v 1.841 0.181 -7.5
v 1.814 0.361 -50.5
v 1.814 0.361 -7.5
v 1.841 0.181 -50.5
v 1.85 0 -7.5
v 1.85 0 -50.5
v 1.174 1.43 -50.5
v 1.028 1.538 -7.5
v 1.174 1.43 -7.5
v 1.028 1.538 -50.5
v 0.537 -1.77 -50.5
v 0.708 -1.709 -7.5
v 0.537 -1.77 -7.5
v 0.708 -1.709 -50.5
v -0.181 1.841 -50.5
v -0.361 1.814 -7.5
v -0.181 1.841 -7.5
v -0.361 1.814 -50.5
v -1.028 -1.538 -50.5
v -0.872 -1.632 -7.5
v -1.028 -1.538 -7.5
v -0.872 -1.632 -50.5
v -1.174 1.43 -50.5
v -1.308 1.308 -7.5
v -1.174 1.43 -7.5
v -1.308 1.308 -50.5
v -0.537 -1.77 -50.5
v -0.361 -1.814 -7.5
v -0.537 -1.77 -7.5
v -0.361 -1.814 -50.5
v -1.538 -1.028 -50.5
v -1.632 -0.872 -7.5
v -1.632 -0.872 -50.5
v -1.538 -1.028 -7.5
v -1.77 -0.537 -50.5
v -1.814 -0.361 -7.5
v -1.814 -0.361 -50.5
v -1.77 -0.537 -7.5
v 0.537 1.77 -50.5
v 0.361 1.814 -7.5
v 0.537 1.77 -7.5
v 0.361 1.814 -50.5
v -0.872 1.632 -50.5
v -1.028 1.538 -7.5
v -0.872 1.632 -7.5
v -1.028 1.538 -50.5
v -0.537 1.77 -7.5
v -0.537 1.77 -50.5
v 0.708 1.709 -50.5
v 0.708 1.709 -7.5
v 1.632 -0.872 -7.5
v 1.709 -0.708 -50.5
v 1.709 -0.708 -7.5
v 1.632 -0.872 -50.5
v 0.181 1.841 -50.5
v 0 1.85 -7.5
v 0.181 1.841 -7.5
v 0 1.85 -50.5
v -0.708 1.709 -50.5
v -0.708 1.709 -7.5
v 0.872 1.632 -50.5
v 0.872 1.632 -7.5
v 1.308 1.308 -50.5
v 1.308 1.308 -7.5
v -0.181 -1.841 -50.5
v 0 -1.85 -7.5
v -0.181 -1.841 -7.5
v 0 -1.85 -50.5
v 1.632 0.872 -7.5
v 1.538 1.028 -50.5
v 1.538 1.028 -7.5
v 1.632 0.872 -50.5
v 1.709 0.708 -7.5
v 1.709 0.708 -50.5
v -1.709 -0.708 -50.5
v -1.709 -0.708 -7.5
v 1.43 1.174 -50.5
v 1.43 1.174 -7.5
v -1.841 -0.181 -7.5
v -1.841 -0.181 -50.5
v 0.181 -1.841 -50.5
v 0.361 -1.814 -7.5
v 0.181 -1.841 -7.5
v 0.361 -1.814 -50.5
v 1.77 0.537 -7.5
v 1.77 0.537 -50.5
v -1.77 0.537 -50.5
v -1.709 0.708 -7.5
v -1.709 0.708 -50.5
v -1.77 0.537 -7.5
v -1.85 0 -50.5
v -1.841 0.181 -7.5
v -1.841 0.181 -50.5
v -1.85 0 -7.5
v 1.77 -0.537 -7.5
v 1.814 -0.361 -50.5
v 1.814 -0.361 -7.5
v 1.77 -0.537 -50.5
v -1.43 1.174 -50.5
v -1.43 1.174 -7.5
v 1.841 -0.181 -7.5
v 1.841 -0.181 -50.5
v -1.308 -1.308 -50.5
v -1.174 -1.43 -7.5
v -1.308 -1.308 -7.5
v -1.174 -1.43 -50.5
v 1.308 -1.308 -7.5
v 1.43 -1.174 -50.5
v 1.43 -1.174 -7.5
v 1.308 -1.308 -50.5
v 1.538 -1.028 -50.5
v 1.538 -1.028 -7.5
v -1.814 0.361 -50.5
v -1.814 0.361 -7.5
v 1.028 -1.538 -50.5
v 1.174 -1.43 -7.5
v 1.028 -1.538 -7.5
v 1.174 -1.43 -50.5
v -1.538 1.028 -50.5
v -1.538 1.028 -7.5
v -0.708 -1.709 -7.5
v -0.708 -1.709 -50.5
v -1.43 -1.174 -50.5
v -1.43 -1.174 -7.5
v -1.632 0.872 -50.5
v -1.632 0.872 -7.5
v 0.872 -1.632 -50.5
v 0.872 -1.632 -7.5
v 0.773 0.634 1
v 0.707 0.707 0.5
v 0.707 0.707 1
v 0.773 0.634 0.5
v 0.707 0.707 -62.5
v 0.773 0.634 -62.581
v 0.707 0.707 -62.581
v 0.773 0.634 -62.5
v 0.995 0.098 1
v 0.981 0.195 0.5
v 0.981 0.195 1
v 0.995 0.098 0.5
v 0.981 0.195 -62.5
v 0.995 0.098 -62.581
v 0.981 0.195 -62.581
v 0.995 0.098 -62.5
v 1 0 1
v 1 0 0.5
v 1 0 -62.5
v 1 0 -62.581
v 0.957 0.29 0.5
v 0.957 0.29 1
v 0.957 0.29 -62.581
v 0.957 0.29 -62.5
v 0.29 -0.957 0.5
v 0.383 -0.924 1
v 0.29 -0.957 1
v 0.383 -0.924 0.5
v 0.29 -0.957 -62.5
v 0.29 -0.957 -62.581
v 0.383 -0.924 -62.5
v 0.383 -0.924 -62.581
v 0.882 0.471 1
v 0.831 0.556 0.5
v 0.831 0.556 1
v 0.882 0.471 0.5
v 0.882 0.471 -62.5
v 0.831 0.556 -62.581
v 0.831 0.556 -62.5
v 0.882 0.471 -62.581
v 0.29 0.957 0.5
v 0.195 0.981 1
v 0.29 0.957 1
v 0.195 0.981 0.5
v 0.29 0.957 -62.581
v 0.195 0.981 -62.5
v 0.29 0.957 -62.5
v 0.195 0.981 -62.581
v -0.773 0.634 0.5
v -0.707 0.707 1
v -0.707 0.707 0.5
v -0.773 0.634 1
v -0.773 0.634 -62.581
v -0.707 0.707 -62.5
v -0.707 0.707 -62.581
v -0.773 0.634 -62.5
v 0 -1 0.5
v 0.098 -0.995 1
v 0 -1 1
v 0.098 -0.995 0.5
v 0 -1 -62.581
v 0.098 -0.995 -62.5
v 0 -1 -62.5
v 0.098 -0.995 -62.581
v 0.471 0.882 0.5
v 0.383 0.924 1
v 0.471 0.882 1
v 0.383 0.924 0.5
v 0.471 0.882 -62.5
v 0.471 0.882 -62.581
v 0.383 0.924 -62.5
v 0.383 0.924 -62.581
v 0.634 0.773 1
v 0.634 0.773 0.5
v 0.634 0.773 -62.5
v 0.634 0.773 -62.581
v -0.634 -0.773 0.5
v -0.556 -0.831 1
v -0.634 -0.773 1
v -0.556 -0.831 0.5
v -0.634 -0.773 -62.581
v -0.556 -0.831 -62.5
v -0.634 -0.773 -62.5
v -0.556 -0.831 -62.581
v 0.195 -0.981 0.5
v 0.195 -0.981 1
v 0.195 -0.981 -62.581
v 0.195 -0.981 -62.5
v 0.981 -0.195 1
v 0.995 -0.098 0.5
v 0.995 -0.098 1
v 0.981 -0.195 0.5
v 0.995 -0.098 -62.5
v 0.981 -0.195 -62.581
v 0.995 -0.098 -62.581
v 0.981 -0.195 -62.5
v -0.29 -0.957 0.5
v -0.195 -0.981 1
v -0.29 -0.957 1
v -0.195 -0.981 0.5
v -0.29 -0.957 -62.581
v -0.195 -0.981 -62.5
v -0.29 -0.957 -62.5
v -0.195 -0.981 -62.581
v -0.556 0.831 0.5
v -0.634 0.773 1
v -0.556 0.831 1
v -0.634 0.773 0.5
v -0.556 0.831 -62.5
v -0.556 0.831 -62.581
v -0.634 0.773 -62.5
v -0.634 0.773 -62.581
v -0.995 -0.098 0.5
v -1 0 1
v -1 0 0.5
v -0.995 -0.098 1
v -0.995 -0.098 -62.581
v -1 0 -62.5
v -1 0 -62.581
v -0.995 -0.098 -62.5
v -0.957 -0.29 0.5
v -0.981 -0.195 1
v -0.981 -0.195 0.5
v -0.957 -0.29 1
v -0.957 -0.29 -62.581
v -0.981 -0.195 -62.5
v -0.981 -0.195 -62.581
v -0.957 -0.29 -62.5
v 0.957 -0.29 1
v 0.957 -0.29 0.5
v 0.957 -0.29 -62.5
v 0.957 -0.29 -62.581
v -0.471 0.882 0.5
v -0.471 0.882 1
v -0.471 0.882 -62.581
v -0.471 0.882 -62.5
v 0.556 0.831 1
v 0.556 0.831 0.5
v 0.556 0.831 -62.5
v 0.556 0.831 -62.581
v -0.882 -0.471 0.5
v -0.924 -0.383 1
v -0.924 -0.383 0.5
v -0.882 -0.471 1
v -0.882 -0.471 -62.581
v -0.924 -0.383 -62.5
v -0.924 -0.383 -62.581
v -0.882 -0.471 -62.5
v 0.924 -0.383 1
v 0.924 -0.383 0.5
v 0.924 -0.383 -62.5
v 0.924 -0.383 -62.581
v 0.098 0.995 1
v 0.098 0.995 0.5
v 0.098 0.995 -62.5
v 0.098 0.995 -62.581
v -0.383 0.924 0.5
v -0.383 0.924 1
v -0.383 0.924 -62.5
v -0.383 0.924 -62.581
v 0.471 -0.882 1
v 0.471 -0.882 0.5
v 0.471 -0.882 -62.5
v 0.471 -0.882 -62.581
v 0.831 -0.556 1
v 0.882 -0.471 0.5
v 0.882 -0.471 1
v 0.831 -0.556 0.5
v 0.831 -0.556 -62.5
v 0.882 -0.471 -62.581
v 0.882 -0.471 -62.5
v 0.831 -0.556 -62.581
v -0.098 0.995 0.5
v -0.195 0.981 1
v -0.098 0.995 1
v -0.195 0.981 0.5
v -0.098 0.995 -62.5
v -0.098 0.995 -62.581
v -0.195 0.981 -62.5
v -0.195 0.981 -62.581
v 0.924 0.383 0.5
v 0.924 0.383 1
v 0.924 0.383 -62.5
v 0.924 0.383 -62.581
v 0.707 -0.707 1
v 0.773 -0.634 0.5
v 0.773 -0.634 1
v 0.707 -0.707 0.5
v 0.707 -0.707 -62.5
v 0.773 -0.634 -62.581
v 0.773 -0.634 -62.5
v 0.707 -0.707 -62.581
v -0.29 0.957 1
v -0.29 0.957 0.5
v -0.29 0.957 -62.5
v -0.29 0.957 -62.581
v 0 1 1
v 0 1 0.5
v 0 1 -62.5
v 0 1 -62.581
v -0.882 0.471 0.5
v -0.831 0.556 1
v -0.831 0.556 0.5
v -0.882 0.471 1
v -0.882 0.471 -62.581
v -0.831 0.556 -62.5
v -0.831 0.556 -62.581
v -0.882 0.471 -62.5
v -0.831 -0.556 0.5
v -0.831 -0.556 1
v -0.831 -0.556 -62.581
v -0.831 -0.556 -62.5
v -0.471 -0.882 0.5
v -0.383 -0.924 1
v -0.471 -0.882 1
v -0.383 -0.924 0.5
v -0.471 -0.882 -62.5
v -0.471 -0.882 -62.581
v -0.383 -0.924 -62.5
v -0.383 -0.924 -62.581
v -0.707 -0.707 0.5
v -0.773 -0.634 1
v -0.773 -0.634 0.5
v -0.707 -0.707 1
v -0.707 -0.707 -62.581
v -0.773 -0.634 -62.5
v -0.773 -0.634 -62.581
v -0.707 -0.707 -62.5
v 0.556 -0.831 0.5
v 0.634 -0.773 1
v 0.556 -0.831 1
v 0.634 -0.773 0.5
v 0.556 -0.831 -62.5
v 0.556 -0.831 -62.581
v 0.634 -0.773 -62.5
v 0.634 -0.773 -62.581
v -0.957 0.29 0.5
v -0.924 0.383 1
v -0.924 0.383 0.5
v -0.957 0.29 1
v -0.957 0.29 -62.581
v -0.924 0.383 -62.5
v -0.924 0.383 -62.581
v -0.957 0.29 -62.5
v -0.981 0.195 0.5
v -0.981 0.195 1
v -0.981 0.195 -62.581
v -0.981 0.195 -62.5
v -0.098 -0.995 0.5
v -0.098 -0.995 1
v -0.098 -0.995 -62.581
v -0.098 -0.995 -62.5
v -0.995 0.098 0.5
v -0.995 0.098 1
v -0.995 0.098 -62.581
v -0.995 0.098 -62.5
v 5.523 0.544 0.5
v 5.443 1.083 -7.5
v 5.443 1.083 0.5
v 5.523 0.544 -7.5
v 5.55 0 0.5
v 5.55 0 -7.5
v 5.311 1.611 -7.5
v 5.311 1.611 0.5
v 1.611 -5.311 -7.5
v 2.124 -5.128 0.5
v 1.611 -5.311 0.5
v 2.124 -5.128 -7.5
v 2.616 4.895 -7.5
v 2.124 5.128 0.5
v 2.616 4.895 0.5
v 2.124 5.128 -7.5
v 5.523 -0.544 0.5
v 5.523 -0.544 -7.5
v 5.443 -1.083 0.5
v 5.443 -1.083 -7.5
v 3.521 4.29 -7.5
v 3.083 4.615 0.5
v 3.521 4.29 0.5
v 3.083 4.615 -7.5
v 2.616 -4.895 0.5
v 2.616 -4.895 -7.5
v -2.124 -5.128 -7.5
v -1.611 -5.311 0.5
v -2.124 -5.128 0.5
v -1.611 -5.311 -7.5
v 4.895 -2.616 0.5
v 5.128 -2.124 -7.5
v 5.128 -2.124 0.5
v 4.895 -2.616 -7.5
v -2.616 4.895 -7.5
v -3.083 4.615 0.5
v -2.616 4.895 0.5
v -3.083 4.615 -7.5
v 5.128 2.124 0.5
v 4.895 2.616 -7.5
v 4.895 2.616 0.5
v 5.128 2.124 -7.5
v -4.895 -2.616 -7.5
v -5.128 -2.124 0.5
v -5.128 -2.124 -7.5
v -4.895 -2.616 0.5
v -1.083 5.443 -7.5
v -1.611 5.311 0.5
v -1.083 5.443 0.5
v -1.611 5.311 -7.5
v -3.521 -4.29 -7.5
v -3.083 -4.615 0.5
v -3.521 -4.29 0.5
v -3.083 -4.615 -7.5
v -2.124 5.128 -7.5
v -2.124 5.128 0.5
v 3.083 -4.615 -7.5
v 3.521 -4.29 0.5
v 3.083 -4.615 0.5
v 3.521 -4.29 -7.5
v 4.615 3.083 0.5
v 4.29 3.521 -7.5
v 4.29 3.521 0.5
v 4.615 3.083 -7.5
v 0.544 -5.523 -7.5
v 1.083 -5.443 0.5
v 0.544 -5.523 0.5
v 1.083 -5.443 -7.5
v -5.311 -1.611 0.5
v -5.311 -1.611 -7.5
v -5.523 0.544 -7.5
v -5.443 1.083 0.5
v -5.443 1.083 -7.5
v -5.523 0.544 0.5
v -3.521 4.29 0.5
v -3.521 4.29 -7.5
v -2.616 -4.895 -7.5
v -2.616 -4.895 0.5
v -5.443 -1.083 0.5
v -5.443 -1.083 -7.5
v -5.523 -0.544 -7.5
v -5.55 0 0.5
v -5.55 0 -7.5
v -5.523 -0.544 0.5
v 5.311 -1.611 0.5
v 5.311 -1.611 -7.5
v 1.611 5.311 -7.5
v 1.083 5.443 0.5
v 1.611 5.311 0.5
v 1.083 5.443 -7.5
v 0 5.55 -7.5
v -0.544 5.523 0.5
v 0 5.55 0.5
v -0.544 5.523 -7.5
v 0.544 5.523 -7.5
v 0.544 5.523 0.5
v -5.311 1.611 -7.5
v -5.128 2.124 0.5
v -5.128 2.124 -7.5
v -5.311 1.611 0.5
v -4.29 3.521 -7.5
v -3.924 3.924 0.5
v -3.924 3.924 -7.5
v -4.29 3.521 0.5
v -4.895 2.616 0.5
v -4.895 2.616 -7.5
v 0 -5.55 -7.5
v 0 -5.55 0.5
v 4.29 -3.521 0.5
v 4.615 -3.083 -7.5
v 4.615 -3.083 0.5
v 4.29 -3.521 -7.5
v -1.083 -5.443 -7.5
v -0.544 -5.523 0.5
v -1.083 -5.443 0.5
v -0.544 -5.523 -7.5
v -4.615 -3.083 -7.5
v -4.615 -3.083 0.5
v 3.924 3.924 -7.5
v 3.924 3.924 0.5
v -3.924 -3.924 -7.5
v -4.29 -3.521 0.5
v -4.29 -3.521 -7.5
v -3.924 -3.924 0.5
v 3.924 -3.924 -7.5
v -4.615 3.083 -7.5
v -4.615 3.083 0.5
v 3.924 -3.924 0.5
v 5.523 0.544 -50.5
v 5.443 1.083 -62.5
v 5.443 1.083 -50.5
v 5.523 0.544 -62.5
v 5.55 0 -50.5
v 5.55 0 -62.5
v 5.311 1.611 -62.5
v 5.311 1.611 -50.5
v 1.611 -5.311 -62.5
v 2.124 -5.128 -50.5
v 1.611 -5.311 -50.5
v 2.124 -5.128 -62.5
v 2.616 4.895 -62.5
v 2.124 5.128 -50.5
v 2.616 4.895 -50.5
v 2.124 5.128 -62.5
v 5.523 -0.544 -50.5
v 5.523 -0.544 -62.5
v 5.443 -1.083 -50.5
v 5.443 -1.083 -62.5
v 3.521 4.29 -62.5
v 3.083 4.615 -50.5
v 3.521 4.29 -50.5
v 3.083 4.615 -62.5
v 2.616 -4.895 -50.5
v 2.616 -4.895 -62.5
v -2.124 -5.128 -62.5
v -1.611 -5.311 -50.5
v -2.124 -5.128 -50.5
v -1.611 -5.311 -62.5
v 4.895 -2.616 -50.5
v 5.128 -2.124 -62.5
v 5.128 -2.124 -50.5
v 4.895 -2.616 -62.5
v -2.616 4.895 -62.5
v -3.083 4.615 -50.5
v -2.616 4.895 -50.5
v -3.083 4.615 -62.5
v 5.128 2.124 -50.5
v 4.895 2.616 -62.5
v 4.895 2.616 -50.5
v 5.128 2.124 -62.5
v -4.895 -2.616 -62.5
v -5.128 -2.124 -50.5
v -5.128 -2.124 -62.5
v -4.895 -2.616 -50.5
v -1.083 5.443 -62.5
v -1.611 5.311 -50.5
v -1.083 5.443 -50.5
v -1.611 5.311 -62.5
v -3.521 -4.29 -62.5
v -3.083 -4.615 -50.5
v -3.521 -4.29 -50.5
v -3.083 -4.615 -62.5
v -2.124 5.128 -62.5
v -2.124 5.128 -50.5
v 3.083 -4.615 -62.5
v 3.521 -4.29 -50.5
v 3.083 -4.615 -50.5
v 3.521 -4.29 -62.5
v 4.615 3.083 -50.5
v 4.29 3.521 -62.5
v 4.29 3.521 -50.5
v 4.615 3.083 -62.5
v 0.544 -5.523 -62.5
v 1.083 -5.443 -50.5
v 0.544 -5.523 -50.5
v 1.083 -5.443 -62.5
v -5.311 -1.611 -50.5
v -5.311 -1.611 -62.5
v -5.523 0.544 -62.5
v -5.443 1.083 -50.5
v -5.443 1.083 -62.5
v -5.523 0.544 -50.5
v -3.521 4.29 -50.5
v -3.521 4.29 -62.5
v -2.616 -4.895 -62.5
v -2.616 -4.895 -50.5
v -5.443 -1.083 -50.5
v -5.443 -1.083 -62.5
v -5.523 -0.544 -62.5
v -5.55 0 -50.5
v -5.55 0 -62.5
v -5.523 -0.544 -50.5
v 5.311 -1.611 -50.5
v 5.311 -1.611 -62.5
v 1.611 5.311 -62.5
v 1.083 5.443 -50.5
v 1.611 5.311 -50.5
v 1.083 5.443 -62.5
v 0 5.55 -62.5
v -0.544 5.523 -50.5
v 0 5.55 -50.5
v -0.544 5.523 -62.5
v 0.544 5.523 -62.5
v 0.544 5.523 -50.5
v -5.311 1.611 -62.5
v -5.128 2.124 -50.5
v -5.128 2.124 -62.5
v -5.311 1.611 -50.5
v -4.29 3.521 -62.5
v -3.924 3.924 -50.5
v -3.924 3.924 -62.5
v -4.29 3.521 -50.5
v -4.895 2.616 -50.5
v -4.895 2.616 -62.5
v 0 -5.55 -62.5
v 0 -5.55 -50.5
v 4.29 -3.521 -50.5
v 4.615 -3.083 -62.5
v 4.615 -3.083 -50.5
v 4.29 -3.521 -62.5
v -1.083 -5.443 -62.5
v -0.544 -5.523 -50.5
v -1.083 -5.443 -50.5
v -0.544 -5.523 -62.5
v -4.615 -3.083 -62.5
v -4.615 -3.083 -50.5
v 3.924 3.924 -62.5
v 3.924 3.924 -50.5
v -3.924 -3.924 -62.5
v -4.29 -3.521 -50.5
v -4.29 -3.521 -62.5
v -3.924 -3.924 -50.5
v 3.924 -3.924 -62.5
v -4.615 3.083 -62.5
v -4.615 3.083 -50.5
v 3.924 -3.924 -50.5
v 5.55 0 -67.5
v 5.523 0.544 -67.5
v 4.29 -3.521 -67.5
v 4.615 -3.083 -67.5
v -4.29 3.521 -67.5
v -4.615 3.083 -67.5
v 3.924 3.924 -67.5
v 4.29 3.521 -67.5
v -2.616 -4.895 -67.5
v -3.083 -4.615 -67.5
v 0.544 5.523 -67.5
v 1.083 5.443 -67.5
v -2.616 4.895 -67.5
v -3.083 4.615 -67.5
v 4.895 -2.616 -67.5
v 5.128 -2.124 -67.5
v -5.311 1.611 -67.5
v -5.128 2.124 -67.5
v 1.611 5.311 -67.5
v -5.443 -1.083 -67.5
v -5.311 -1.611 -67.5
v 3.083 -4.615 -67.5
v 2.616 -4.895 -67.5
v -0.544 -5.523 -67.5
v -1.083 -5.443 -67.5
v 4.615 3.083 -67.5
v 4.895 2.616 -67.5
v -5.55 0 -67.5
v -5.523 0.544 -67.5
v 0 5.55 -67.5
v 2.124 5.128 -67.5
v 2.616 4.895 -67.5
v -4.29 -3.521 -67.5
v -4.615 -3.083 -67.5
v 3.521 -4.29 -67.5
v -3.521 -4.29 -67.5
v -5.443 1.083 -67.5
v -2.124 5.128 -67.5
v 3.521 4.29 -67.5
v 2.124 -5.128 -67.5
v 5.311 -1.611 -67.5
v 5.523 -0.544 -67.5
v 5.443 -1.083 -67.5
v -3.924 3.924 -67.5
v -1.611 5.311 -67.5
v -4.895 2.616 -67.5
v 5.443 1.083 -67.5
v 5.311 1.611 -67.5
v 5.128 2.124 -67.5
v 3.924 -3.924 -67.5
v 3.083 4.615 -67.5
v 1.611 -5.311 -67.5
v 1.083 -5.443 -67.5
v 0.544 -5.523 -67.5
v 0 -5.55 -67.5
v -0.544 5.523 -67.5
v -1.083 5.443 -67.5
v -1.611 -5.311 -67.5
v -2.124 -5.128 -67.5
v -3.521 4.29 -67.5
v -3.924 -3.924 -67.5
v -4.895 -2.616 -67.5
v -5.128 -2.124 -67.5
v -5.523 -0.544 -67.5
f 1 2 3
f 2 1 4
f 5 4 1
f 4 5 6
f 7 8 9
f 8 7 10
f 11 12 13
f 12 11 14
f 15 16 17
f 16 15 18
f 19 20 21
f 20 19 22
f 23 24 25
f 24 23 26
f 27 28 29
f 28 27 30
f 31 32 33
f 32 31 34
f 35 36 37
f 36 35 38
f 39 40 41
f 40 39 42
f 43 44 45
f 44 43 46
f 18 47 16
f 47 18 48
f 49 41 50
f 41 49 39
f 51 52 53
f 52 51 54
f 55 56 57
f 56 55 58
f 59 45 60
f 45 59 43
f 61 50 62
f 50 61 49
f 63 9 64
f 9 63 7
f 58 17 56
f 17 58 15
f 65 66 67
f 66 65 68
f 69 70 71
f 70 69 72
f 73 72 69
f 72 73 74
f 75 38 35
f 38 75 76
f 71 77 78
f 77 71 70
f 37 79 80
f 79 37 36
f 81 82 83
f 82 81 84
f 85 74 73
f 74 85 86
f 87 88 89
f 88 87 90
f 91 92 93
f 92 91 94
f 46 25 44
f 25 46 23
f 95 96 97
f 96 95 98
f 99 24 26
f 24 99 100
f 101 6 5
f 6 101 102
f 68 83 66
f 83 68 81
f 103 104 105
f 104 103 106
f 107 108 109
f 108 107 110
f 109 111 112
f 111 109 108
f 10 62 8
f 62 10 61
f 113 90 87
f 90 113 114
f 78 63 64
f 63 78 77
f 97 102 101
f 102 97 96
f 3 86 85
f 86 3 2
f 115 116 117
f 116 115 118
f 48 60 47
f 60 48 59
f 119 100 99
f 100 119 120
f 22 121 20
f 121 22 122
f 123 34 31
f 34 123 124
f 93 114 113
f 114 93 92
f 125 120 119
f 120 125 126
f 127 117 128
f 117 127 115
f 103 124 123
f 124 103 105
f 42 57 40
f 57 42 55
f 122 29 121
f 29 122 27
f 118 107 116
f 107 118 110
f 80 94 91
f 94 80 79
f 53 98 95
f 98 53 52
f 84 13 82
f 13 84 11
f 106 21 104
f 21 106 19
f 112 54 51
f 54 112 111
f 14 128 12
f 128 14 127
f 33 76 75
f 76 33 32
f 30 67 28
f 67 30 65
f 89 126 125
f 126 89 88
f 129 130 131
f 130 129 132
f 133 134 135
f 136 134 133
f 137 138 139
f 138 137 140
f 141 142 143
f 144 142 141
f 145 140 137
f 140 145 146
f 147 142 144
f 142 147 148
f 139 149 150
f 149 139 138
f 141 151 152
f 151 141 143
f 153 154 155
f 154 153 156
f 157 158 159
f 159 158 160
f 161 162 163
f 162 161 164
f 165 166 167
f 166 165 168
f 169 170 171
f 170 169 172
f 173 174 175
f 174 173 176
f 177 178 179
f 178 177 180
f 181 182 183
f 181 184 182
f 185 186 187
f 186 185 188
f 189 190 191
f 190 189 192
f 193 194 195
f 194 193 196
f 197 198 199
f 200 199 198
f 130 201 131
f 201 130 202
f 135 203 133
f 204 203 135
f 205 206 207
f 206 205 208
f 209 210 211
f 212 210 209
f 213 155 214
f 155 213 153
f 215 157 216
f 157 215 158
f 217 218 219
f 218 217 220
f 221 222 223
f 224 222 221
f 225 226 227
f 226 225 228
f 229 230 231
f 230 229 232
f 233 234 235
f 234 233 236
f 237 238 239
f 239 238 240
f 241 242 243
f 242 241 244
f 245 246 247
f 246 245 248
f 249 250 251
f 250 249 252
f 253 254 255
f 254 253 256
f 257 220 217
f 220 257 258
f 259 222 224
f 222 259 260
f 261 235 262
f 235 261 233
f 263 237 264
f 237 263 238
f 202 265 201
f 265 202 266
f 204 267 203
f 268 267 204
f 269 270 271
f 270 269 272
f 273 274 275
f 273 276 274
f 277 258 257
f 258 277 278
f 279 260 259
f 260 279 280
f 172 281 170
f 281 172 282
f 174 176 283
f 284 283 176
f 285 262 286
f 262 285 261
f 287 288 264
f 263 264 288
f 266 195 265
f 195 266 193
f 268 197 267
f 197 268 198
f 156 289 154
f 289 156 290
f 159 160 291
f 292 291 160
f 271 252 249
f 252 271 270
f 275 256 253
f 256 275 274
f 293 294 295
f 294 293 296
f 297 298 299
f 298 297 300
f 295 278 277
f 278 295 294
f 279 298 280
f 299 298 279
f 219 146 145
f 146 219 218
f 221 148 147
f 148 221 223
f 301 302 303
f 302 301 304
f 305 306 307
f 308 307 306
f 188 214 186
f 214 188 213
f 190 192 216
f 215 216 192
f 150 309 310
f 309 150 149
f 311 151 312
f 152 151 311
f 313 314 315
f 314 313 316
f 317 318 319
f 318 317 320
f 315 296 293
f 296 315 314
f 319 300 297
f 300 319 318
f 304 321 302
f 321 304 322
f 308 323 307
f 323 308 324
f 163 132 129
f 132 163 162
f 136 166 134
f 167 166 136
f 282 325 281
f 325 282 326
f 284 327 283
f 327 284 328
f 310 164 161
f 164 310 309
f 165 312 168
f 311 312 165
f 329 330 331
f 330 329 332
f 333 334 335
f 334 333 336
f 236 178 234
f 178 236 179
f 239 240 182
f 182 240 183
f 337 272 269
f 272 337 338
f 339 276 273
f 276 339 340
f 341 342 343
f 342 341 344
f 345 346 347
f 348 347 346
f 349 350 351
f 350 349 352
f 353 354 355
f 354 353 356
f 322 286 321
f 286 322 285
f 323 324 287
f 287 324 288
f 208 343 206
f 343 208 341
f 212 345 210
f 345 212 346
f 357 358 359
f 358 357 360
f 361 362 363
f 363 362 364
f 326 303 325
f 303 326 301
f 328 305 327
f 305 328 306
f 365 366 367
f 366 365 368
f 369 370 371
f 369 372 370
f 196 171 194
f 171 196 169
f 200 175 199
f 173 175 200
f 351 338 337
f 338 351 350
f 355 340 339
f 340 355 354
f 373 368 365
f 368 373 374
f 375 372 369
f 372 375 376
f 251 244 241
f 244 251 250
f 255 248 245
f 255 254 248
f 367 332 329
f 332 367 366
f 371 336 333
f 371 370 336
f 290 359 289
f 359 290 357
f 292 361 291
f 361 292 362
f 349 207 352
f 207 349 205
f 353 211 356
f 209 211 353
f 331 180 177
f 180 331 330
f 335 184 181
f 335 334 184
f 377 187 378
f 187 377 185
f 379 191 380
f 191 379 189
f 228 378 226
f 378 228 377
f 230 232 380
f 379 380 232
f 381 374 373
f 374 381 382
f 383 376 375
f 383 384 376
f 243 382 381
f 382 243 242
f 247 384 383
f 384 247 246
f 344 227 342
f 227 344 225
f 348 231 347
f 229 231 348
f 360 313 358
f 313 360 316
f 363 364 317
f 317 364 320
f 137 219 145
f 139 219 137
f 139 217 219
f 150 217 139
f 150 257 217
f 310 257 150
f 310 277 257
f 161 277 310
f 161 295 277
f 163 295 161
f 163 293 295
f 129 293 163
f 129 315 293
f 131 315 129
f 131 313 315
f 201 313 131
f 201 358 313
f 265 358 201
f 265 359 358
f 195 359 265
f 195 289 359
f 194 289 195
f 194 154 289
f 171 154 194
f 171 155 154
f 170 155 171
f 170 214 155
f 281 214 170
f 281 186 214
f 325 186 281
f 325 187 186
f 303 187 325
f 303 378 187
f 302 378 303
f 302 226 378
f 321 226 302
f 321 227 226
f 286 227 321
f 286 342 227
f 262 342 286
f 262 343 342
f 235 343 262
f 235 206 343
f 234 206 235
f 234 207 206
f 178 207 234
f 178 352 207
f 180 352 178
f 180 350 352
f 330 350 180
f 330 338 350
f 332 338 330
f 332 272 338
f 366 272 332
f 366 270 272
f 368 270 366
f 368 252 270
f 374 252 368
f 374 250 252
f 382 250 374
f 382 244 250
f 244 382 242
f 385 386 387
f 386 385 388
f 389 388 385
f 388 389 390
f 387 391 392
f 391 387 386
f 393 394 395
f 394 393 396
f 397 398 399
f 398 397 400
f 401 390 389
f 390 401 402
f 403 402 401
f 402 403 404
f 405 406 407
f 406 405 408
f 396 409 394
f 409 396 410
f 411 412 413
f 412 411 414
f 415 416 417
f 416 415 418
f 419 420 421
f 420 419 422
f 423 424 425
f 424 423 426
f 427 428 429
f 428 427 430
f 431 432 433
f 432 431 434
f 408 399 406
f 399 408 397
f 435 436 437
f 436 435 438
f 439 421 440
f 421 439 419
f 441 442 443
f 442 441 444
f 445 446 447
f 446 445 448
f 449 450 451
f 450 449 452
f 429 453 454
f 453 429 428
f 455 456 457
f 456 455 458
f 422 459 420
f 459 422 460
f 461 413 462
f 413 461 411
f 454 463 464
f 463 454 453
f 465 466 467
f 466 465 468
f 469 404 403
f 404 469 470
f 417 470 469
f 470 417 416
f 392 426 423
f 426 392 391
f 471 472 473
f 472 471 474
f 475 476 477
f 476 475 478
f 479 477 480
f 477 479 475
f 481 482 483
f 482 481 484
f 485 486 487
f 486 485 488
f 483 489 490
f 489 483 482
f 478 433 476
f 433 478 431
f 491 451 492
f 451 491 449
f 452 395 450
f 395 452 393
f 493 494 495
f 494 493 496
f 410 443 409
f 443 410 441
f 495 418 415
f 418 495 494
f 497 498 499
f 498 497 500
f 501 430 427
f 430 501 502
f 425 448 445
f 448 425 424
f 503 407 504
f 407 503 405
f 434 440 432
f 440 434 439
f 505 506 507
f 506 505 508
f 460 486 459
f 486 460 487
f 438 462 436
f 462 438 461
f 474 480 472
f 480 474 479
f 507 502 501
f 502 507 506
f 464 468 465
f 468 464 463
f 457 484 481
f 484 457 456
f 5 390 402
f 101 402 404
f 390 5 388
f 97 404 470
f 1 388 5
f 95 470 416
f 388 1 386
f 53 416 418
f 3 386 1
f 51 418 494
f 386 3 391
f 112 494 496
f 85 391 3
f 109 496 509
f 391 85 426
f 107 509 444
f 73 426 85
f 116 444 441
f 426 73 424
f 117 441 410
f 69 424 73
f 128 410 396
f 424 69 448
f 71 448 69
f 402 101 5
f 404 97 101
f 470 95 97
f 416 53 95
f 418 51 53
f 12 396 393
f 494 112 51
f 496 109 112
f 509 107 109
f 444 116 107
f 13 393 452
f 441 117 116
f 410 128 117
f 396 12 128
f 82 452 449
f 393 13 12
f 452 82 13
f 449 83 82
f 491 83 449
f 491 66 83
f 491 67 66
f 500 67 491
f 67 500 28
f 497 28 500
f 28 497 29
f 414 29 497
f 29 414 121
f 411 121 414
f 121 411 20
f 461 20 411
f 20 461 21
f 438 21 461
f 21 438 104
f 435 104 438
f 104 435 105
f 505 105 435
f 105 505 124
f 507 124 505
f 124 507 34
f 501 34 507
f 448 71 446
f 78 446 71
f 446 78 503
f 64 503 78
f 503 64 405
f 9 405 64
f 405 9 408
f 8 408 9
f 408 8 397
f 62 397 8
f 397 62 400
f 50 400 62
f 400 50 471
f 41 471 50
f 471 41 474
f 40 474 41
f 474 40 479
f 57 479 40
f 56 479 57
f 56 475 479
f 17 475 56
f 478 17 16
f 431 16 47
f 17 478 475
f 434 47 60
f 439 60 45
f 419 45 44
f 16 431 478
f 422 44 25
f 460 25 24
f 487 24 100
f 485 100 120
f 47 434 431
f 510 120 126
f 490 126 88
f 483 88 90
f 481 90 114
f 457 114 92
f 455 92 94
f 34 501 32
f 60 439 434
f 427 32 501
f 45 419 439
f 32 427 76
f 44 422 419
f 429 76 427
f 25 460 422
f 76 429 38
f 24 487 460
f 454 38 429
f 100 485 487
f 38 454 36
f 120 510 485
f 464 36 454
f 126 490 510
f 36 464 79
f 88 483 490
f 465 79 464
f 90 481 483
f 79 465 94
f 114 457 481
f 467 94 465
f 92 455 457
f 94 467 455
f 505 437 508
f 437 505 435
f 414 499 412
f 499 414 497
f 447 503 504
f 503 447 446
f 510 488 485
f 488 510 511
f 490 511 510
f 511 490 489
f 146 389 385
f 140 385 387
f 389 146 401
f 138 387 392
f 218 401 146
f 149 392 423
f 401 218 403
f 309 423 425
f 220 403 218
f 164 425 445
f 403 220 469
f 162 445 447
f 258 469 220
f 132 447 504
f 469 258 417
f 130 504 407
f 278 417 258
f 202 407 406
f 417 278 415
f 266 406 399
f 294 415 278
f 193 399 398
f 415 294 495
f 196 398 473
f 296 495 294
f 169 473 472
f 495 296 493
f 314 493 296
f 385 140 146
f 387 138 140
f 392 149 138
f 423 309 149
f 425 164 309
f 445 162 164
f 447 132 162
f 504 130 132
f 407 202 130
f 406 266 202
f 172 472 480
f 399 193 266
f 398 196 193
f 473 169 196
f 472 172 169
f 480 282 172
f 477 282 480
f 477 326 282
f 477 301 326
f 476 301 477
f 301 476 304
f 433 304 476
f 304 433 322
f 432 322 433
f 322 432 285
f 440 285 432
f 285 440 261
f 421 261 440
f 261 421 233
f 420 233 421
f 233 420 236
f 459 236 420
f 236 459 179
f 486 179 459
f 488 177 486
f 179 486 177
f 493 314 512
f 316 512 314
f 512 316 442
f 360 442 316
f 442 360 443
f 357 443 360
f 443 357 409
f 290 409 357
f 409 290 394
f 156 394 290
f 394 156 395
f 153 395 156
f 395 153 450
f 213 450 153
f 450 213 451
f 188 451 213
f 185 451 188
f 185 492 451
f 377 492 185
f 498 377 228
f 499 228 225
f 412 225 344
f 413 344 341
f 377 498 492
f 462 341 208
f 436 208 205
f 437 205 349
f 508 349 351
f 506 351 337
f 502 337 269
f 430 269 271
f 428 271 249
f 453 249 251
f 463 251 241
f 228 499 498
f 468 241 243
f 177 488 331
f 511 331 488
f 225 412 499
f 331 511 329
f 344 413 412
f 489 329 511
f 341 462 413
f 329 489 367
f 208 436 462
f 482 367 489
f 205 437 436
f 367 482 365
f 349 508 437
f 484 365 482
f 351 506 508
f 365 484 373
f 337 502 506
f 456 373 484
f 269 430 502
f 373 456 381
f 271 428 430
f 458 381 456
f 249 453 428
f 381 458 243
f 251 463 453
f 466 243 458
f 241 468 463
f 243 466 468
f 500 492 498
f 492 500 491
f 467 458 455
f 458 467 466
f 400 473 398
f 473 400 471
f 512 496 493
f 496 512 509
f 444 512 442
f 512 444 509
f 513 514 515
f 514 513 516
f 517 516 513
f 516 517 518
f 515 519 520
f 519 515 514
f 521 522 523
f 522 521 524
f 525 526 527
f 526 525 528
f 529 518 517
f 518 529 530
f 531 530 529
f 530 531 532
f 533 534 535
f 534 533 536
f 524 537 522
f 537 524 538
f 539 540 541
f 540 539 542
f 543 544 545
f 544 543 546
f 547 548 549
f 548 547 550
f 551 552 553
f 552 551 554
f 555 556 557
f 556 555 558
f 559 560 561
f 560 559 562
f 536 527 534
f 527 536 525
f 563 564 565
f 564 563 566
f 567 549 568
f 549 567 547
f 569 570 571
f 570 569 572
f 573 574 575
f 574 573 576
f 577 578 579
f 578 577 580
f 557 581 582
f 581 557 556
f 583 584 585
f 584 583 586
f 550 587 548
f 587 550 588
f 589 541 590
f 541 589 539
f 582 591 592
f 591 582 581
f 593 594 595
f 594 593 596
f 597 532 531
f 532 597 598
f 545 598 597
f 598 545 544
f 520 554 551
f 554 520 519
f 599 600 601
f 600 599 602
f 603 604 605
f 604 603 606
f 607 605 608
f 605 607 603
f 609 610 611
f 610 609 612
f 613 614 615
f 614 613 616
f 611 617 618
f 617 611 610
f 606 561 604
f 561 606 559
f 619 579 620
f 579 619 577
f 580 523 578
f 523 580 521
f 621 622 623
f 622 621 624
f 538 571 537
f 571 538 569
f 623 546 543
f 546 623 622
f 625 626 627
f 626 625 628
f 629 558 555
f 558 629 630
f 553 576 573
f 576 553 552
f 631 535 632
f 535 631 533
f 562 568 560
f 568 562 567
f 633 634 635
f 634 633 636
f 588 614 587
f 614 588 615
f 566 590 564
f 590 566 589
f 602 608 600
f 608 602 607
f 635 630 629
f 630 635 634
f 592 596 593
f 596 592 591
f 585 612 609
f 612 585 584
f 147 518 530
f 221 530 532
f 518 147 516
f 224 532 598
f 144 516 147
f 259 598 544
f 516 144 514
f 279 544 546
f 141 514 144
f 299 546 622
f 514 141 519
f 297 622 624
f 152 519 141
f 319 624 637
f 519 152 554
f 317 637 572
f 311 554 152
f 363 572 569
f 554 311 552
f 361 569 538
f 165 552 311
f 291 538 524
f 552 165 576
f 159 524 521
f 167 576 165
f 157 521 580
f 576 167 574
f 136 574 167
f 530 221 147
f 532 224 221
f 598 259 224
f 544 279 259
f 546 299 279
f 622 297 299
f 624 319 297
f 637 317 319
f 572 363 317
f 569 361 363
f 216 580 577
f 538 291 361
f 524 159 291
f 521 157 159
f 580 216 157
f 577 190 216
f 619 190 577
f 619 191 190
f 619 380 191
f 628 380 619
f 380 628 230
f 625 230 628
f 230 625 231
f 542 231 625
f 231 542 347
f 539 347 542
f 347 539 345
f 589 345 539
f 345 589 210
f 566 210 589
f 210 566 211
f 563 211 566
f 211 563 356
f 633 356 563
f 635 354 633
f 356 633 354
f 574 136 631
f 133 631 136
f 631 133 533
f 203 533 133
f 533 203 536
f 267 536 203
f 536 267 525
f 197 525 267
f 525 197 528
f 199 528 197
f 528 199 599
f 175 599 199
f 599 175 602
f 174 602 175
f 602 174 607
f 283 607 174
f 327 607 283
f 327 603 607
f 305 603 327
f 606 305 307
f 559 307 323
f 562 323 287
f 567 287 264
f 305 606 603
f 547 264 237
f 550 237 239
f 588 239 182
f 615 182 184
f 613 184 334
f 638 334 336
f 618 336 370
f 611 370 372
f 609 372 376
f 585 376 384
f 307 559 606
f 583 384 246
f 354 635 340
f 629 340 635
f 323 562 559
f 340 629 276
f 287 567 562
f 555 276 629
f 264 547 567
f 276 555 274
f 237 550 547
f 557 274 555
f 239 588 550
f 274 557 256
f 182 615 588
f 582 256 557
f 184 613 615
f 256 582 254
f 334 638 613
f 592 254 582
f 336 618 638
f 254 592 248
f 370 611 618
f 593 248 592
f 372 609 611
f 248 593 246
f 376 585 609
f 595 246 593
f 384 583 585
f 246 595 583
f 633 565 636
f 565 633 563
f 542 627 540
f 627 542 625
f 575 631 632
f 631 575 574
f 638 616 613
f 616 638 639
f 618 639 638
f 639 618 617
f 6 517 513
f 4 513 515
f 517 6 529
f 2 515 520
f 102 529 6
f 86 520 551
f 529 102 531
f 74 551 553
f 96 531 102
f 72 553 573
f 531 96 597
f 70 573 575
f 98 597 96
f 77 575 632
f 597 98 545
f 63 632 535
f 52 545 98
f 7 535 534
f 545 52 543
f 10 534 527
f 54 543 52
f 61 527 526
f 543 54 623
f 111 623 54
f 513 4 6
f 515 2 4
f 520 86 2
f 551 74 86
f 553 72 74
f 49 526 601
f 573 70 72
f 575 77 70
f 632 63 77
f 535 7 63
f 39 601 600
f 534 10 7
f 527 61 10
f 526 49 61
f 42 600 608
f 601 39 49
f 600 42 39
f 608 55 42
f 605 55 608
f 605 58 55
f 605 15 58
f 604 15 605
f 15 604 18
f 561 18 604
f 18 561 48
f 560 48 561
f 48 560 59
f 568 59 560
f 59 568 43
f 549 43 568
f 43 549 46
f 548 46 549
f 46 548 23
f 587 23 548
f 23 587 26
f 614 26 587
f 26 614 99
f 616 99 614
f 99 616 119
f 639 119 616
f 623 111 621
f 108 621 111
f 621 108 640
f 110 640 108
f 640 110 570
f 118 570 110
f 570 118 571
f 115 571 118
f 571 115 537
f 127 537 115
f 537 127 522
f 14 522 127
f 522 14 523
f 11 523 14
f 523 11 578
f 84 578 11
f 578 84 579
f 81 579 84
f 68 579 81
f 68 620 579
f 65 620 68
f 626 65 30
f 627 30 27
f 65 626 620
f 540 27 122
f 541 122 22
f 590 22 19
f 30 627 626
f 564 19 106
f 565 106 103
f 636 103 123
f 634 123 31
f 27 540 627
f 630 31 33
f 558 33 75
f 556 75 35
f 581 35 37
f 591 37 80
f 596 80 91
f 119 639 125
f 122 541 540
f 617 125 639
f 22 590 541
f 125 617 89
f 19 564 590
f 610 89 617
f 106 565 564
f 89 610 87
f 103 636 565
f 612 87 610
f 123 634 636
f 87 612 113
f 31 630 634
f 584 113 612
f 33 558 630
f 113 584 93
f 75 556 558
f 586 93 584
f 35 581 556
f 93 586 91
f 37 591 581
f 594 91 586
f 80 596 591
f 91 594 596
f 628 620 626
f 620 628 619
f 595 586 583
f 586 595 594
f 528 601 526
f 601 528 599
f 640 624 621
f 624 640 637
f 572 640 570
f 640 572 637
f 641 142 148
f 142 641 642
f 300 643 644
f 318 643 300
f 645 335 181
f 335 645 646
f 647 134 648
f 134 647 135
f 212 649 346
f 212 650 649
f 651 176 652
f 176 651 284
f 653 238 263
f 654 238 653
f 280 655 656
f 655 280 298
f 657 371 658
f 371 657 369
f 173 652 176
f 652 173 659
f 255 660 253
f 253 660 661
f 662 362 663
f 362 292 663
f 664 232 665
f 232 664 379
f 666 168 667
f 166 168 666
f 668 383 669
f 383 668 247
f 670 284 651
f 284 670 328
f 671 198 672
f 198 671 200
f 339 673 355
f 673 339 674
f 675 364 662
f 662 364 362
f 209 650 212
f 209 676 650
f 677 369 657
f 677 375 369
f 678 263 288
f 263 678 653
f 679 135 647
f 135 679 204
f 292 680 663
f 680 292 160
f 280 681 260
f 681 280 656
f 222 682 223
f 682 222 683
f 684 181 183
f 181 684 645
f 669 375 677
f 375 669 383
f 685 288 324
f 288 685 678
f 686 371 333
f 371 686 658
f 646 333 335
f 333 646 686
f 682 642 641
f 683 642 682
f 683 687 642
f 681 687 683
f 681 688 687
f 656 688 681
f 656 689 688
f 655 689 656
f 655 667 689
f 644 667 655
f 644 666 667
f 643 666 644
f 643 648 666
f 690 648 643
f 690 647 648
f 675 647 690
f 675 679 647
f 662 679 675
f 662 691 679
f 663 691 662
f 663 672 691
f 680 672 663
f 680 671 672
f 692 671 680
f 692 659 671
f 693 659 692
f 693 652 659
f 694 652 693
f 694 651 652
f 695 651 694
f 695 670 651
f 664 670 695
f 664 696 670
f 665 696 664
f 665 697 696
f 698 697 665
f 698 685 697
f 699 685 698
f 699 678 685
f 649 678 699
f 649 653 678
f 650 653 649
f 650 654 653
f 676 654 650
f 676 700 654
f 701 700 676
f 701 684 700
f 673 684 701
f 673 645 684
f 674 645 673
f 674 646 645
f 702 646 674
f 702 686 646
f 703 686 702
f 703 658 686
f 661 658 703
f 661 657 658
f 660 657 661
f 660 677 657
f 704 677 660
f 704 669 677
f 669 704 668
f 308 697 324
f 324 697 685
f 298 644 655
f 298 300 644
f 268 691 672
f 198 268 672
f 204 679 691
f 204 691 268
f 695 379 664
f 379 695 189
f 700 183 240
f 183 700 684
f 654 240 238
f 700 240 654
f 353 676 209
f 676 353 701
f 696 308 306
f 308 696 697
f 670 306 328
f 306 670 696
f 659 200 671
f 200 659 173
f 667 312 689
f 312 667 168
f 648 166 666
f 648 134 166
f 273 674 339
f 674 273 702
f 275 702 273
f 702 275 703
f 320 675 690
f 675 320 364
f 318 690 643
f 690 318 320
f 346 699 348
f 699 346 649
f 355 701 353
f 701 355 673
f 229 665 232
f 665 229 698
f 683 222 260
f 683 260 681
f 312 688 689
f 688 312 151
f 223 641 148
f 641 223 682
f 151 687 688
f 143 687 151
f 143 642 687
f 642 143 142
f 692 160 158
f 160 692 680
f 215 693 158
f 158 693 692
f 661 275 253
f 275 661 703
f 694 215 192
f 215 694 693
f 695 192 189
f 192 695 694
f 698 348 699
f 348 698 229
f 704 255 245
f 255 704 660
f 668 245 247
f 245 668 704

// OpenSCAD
// Parameters
total_length_mm = 62; //[31:124:0.5]
barrel_outer_diameter_mm = 3.7; //[1.85:7.4:0.05]
filament_diameter_mm = 1.75; //[1.5:3:0.05]
filament_bore_diameter_mm = 2; //[1.8:3:0.05]
origin_z_top_face = 0; //[0:0:1]
overlap_mm = 1; //[0.5:2:0.1]
placeholder_radial_scale = 3; //[1.5:6:0.1]
mounting_interface_length_mm = 8; //[4:16:0.5]
heater_block_length_mm = 12; //[6:24:0.5]
nozzle_length_mm = 6; //[3:12:0.5]

// Hot End - complete geometry
module hot_end() {
  color("DimGray") {
    // Main barrel
    translate([0, 0, -total_length_mm/2])
      cylinder(h=total_length_mm, r=barrel_outer_diameter_mm/2, center=true, $fn=64);
    
    // Filament bore
    translate([0, 0, -total_length_mm/2])
      cylinder(h=total_length_mm + 2*overlap_mm, r=filament_bore_diameter_mm/2, center=true, $fn=64);
  }
}

// E3D Hot End Assembly - complete geometry
module e3d_hot_end_assembly() {
  color("Black") {
    // Mounting interface placeholder
    translate([0, 0, -mounting_interface_length_mm/2 + overlap_mm/2])
      cylinder(h=mounting_interface_length_mm, r=(barrel_outer_diameter_mm*placeholder_radial_scale)/2, center=true, $fn=64);
    
    // Heater block placeholder
    translate([0, 0, -total_length_mm + heater_block_length_mm/2 - overlap_mm/2])
      cylinder(h=heater_block_length_mm, r=(barrel_outer_diameter_mm*placeholder_radial_scale)/2, center=true, $fn=64);
    
    // Nozzle placeholder
    translate([0, 0, -total_length_mm - nozzle_length_mm/2 + overlap_mm/2])
      cylinder(h=nozzle_length_mm, r1=(barrel_outer_diameter_mm*placeholder_radial_scale)/2, r2=0, center=true, $fn=64);
  }
}

// E3D Hot End - complete geometry
module e3d_hot_end() {
  e3d_hot_end_assembly();
}

// Jhead Hot End Assembly - complete geometry
module jhead_hot_end_assembly() {
  color("Silver") {
    // Mounting interface placeholder
    translate([0, 0, -mounting_interface_length_mm/2 + overlap_mm/2])
      cylinder(h=mounting_interface_length_mm, r=(barrel_outer_diameter_mm*placeholder_radial_scale)/2, center=true, $fn=64);
    
    // Heater block placeholder
    translate([0, 0, -total_length_mm + heater_block_length_mm/2 - overlap_mm/2])
      cylinder(h=heater_block_length_mm, r=(barrel_outer_diameter_mm*placeholder_radial_scale)/2, center=true, $fn=64);
    
    // Nozzle placeholder
    translate([0, 0, -total_length_mm - nozzle_length_mm/2 + overlap_mm/2])
      cylinder(h=nozzle_length_mm, r1=(barrel_outer_diameter_mm*placeholder_radial_scale)/2, r2=0, center=true, $fn=64);
  }
}

// Jhead Hot End - complete geometry
module jhead_hot_end() {
  jhead_hot_end_assembly();
}

// Assembly
module assembly() {
  hot_end();
  translate([0, 0, 0]) e3d_hot_end();
  translate([0, 0, 0]) jhead_hot_end();
}

assembly();
